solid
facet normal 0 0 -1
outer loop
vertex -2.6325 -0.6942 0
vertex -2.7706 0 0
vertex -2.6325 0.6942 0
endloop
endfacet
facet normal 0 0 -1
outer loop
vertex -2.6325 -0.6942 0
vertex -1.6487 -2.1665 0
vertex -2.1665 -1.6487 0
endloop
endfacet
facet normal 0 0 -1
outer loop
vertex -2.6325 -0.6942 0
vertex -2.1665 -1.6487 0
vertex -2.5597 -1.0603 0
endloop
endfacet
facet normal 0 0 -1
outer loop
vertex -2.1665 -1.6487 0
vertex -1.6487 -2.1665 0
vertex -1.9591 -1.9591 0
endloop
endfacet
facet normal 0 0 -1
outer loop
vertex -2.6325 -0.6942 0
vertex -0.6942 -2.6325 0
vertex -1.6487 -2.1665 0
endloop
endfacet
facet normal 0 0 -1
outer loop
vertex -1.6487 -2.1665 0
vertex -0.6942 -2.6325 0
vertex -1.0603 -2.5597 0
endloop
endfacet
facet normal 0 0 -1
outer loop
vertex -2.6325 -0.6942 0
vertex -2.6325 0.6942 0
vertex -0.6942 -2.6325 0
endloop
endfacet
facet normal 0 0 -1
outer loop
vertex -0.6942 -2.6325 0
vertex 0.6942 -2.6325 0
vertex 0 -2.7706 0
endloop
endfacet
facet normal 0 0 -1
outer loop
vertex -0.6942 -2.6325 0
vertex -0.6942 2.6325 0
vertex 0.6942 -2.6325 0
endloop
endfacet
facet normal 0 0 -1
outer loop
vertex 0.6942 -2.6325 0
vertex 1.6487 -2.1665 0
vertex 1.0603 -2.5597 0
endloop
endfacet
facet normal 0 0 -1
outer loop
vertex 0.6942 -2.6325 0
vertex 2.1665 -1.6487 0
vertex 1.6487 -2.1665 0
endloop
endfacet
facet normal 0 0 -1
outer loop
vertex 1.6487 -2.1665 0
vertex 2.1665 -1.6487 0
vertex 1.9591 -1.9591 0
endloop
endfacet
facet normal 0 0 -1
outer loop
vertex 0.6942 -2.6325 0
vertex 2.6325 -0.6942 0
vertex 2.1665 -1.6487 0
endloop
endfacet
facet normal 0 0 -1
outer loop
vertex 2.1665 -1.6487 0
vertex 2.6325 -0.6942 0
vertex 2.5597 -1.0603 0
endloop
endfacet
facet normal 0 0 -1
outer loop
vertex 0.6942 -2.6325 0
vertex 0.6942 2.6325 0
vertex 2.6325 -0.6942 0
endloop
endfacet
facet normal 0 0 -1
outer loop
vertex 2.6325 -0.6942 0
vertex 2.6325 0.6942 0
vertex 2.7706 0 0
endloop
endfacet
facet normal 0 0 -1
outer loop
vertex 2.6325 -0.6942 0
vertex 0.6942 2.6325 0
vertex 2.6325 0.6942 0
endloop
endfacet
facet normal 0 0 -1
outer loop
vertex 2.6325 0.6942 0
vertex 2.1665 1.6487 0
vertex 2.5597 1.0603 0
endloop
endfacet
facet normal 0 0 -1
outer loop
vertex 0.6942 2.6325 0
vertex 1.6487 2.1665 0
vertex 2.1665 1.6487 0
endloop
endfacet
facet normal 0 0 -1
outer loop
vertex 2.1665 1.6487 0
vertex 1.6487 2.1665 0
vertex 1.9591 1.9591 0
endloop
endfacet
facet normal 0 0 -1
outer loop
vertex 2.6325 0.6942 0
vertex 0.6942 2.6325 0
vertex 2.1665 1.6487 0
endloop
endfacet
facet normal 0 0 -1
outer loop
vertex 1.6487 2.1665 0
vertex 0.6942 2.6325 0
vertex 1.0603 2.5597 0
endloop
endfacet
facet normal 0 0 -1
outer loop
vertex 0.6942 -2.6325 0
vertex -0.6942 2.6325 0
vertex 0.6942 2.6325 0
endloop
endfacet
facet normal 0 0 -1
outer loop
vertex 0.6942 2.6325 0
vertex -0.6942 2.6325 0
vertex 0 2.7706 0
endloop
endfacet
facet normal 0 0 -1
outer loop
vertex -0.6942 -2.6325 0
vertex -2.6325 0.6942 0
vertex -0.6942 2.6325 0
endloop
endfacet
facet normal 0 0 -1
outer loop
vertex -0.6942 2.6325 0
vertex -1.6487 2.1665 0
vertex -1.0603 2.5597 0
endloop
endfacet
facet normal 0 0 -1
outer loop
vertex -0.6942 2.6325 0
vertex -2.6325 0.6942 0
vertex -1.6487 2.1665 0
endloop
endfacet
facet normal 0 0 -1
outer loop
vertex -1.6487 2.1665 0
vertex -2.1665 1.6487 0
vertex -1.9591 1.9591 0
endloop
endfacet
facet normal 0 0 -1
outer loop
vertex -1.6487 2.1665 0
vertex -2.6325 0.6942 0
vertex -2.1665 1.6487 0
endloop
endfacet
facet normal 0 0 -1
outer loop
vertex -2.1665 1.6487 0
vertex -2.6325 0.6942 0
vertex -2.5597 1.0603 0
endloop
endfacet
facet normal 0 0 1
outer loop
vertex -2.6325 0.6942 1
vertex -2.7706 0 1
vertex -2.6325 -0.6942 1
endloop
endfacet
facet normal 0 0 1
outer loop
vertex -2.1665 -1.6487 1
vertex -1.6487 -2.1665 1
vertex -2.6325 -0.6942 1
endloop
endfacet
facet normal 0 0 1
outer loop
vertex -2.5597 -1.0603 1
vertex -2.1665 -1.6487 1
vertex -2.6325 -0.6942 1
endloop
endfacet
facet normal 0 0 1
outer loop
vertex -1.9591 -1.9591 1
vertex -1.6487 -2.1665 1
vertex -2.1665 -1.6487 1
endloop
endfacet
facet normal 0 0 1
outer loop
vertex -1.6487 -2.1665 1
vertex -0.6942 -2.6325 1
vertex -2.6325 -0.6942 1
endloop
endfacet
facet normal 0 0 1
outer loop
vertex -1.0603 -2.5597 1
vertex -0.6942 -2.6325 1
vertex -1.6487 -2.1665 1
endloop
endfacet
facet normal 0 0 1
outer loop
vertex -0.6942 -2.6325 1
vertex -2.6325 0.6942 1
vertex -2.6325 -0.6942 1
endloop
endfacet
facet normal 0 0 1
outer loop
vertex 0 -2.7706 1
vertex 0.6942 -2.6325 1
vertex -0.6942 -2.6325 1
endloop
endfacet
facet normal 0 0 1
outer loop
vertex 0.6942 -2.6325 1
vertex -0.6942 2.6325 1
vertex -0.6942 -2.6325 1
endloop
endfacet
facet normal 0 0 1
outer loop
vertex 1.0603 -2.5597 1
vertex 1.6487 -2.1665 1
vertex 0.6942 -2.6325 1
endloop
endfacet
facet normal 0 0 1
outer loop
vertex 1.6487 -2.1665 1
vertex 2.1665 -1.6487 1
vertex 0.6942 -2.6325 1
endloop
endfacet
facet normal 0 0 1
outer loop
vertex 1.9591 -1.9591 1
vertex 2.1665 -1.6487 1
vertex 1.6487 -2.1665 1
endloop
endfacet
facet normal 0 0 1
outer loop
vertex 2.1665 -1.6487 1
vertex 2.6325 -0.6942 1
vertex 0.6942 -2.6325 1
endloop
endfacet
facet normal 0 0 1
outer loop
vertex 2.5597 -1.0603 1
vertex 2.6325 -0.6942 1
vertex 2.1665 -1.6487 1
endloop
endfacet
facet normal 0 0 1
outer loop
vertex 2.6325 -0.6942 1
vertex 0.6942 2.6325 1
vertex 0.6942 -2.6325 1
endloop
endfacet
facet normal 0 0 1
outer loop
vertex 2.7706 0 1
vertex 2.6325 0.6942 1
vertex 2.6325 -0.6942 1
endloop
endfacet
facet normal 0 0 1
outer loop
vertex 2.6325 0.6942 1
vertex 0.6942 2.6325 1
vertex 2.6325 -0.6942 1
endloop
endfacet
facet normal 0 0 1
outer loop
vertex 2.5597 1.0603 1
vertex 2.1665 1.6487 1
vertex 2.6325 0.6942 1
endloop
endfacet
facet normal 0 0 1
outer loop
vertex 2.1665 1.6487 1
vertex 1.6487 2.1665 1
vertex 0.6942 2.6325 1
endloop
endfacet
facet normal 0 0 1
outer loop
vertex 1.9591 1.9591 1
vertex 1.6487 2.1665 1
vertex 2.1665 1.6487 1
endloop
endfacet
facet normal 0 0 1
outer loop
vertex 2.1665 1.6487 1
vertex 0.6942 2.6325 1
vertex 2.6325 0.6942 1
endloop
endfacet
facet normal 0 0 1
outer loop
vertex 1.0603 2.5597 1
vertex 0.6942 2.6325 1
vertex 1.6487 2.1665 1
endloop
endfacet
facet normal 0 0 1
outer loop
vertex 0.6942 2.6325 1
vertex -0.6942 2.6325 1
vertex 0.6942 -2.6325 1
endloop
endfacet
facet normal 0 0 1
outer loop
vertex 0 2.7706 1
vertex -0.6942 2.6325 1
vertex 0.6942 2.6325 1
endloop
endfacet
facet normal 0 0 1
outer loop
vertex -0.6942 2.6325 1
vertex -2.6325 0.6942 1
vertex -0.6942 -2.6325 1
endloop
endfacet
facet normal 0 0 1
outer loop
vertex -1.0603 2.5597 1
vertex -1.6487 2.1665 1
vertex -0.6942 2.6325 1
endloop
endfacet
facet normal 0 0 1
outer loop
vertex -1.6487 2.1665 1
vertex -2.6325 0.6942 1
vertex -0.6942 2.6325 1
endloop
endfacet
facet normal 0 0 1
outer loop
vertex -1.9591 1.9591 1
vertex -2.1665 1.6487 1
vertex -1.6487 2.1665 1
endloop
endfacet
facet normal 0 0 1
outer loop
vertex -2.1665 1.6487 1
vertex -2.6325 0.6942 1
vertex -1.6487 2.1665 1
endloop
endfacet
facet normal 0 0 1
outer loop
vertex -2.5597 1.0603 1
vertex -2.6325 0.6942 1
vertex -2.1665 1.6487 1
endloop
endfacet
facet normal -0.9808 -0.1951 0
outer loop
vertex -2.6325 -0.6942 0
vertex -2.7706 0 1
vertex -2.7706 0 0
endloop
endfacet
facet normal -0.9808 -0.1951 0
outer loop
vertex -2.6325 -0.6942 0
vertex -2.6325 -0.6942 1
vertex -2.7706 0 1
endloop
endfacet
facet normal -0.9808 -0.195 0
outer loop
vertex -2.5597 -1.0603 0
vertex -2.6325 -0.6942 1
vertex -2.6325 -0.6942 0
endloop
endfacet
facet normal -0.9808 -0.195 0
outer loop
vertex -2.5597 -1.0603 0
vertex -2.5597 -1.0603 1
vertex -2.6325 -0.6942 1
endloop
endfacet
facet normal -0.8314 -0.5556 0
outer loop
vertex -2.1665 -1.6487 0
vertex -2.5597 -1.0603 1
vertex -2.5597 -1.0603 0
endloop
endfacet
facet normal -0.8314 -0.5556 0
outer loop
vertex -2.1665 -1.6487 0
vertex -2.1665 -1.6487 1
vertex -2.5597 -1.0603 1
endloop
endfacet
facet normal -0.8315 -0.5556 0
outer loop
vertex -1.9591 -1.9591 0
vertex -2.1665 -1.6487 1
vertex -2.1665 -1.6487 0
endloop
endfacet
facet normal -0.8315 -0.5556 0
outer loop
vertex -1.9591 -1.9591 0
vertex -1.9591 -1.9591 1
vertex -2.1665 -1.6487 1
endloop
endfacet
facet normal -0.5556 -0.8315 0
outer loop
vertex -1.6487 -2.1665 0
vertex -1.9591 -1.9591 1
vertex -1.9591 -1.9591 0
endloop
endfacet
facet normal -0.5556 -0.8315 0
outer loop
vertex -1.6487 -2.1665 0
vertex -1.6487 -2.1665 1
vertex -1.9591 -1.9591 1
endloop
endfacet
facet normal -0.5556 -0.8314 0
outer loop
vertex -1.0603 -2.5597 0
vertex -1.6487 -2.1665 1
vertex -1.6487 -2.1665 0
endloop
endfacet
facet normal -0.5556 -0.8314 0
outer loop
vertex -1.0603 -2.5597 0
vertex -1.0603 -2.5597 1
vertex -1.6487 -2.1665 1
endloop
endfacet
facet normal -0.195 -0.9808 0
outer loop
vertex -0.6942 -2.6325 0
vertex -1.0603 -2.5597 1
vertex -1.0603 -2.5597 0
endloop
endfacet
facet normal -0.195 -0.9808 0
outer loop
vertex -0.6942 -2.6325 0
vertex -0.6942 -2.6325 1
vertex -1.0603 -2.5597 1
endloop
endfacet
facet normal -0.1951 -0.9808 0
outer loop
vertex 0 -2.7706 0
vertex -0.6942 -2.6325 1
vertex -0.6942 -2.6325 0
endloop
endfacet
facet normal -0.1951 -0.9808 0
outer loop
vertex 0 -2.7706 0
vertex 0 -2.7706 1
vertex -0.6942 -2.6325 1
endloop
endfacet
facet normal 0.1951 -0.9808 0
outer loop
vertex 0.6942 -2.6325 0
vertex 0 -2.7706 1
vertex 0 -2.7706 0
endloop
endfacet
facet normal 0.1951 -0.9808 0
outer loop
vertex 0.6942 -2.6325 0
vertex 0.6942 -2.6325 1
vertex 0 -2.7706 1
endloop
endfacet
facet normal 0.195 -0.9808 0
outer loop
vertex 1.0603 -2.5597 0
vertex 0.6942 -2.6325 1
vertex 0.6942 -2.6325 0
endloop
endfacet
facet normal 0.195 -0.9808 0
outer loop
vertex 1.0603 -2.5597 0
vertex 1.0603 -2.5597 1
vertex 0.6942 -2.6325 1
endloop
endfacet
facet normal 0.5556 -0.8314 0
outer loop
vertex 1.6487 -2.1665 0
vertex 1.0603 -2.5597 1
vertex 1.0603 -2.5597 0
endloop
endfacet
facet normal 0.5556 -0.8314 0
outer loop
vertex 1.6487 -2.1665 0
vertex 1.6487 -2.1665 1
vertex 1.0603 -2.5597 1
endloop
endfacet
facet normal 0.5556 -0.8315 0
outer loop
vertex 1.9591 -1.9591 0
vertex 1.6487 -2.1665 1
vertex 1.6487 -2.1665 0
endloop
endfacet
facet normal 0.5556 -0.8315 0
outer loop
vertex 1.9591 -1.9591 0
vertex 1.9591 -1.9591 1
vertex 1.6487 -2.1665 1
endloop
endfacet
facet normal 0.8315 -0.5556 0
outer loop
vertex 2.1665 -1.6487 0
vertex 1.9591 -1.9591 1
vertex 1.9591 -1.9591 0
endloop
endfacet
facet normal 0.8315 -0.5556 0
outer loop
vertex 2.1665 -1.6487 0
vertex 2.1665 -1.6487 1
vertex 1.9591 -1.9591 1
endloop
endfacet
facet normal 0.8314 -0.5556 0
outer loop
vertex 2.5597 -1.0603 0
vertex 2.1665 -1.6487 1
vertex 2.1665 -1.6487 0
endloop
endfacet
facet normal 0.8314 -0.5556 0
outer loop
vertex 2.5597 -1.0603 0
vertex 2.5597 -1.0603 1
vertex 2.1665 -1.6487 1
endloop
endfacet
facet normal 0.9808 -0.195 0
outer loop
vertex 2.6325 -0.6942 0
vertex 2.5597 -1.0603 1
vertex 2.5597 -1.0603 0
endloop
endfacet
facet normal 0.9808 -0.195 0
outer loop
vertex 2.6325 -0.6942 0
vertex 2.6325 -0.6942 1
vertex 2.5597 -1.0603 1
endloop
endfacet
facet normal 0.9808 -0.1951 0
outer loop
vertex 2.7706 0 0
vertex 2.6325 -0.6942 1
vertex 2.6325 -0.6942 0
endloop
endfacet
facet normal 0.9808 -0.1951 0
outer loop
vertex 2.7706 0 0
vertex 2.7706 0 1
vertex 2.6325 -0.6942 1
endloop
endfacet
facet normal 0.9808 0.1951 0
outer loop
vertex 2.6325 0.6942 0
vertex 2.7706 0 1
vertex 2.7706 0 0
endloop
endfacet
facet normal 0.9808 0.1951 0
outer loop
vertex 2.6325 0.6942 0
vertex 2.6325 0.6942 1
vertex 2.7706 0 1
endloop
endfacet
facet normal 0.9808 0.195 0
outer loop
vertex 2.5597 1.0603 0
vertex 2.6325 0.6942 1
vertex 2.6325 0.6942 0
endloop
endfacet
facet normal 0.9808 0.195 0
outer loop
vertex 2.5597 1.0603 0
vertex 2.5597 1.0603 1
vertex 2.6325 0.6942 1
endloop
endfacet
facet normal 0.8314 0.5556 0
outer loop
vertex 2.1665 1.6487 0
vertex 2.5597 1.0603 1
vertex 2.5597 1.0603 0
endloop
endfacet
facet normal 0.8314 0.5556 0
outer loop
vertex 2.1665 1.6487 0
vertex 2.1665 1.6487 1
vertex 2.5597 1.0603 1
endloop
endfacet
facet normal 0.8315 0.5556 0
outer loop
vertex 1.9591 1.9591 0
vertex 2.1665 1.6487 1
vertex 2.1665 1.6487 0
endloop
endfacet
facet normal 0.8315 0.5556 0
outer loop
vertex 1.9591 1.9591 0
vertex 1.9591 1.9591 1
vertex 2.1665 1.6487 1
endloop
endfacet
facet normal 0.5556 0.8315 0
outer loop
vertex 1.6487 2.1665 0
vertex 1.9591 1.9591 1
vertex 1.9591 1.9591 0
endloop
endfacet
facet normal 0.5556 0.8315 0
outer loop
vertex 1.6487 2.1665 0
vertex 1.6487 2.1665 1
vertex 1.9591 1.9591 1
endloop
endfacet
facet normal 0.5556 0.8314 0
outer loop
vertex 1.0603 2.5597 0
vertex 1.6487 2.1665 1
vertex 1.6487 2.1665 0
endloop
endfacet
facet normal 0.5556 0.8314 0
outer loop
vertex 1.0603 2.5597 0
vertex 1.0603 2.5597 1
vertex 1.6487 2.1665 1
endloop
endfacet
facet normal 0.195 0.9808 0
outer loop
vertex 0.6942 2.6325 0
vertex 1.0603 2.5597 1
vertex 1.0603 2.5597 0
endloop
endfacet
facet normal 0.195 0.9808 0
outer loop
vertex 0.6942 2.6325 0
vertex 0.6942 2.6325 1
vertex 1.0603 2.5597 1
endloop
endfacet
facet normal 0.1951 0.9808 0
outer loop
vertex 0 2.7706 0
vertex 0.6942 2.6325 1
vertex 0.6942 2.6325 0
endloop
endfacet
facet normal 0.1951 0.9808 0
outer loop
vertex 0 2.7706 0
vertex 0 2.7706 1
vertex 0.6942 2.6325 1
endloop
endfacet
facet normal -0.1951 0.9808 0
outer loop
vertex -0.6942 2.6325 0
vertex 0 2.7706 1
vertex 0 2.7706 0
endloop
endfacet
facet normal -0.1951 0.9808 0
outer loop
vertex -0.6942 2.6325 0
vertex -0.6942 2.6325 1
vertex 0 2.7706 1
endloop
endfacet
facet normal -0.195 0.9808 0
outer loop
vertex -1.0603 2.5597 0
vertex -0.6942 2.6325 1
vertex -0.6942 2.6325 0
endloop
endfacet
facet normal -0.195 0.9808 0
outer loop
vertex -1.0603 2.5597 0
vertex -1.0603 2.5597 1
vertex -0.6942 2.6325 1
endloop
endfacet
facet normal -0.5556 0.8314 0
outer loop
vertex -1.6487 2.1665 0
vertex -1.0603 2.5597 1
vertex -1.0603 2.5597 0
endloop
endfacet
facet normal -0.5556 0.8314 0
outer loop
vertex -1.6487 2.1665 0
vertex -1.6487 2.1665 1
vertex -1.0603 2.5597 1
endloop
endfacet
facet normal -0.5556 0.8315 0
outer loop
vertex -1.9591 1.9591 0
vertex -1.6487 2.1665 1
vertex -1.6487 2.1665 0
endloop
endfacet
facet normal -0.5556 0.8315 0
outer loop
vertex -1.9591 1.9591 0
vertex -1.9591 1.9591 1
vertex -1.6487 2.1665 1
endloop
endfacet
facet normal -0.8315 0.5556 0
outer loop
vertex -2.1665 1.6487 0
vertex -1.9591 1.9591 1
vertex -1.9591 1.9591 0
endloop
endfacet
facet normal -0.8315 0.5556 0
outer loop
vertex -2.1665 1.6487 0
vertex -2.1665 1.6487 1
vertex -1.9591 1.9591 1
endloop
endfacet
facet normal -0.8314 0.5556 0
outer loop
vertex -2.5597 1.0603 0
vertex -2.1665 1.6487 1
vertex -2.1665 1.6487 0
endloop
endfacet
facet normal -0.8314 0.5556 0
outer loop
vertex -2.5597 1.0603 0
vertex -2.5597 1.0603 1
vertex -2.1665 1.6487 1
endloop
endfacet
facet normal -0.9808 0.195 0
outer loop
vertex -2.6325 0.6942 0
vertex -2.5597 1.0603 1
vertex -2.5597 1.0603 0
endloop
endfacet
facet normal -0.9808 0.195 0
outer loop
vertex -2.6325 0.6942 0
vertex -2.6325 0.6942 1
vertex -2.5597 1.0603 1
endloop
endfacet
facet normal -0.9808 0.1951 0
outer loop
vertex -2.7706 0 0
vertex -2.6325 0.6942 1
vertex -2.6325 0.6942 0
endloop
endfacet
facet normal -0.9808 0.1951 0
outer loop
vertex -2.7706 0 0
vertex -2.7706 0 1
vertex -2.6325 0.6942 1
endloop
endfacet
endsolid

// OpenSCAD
// section of a sphere at z = 0
linear_extrude(1) projection(cut = true) translate([0, 0, -1]) sphere(3, $fn = 16);
